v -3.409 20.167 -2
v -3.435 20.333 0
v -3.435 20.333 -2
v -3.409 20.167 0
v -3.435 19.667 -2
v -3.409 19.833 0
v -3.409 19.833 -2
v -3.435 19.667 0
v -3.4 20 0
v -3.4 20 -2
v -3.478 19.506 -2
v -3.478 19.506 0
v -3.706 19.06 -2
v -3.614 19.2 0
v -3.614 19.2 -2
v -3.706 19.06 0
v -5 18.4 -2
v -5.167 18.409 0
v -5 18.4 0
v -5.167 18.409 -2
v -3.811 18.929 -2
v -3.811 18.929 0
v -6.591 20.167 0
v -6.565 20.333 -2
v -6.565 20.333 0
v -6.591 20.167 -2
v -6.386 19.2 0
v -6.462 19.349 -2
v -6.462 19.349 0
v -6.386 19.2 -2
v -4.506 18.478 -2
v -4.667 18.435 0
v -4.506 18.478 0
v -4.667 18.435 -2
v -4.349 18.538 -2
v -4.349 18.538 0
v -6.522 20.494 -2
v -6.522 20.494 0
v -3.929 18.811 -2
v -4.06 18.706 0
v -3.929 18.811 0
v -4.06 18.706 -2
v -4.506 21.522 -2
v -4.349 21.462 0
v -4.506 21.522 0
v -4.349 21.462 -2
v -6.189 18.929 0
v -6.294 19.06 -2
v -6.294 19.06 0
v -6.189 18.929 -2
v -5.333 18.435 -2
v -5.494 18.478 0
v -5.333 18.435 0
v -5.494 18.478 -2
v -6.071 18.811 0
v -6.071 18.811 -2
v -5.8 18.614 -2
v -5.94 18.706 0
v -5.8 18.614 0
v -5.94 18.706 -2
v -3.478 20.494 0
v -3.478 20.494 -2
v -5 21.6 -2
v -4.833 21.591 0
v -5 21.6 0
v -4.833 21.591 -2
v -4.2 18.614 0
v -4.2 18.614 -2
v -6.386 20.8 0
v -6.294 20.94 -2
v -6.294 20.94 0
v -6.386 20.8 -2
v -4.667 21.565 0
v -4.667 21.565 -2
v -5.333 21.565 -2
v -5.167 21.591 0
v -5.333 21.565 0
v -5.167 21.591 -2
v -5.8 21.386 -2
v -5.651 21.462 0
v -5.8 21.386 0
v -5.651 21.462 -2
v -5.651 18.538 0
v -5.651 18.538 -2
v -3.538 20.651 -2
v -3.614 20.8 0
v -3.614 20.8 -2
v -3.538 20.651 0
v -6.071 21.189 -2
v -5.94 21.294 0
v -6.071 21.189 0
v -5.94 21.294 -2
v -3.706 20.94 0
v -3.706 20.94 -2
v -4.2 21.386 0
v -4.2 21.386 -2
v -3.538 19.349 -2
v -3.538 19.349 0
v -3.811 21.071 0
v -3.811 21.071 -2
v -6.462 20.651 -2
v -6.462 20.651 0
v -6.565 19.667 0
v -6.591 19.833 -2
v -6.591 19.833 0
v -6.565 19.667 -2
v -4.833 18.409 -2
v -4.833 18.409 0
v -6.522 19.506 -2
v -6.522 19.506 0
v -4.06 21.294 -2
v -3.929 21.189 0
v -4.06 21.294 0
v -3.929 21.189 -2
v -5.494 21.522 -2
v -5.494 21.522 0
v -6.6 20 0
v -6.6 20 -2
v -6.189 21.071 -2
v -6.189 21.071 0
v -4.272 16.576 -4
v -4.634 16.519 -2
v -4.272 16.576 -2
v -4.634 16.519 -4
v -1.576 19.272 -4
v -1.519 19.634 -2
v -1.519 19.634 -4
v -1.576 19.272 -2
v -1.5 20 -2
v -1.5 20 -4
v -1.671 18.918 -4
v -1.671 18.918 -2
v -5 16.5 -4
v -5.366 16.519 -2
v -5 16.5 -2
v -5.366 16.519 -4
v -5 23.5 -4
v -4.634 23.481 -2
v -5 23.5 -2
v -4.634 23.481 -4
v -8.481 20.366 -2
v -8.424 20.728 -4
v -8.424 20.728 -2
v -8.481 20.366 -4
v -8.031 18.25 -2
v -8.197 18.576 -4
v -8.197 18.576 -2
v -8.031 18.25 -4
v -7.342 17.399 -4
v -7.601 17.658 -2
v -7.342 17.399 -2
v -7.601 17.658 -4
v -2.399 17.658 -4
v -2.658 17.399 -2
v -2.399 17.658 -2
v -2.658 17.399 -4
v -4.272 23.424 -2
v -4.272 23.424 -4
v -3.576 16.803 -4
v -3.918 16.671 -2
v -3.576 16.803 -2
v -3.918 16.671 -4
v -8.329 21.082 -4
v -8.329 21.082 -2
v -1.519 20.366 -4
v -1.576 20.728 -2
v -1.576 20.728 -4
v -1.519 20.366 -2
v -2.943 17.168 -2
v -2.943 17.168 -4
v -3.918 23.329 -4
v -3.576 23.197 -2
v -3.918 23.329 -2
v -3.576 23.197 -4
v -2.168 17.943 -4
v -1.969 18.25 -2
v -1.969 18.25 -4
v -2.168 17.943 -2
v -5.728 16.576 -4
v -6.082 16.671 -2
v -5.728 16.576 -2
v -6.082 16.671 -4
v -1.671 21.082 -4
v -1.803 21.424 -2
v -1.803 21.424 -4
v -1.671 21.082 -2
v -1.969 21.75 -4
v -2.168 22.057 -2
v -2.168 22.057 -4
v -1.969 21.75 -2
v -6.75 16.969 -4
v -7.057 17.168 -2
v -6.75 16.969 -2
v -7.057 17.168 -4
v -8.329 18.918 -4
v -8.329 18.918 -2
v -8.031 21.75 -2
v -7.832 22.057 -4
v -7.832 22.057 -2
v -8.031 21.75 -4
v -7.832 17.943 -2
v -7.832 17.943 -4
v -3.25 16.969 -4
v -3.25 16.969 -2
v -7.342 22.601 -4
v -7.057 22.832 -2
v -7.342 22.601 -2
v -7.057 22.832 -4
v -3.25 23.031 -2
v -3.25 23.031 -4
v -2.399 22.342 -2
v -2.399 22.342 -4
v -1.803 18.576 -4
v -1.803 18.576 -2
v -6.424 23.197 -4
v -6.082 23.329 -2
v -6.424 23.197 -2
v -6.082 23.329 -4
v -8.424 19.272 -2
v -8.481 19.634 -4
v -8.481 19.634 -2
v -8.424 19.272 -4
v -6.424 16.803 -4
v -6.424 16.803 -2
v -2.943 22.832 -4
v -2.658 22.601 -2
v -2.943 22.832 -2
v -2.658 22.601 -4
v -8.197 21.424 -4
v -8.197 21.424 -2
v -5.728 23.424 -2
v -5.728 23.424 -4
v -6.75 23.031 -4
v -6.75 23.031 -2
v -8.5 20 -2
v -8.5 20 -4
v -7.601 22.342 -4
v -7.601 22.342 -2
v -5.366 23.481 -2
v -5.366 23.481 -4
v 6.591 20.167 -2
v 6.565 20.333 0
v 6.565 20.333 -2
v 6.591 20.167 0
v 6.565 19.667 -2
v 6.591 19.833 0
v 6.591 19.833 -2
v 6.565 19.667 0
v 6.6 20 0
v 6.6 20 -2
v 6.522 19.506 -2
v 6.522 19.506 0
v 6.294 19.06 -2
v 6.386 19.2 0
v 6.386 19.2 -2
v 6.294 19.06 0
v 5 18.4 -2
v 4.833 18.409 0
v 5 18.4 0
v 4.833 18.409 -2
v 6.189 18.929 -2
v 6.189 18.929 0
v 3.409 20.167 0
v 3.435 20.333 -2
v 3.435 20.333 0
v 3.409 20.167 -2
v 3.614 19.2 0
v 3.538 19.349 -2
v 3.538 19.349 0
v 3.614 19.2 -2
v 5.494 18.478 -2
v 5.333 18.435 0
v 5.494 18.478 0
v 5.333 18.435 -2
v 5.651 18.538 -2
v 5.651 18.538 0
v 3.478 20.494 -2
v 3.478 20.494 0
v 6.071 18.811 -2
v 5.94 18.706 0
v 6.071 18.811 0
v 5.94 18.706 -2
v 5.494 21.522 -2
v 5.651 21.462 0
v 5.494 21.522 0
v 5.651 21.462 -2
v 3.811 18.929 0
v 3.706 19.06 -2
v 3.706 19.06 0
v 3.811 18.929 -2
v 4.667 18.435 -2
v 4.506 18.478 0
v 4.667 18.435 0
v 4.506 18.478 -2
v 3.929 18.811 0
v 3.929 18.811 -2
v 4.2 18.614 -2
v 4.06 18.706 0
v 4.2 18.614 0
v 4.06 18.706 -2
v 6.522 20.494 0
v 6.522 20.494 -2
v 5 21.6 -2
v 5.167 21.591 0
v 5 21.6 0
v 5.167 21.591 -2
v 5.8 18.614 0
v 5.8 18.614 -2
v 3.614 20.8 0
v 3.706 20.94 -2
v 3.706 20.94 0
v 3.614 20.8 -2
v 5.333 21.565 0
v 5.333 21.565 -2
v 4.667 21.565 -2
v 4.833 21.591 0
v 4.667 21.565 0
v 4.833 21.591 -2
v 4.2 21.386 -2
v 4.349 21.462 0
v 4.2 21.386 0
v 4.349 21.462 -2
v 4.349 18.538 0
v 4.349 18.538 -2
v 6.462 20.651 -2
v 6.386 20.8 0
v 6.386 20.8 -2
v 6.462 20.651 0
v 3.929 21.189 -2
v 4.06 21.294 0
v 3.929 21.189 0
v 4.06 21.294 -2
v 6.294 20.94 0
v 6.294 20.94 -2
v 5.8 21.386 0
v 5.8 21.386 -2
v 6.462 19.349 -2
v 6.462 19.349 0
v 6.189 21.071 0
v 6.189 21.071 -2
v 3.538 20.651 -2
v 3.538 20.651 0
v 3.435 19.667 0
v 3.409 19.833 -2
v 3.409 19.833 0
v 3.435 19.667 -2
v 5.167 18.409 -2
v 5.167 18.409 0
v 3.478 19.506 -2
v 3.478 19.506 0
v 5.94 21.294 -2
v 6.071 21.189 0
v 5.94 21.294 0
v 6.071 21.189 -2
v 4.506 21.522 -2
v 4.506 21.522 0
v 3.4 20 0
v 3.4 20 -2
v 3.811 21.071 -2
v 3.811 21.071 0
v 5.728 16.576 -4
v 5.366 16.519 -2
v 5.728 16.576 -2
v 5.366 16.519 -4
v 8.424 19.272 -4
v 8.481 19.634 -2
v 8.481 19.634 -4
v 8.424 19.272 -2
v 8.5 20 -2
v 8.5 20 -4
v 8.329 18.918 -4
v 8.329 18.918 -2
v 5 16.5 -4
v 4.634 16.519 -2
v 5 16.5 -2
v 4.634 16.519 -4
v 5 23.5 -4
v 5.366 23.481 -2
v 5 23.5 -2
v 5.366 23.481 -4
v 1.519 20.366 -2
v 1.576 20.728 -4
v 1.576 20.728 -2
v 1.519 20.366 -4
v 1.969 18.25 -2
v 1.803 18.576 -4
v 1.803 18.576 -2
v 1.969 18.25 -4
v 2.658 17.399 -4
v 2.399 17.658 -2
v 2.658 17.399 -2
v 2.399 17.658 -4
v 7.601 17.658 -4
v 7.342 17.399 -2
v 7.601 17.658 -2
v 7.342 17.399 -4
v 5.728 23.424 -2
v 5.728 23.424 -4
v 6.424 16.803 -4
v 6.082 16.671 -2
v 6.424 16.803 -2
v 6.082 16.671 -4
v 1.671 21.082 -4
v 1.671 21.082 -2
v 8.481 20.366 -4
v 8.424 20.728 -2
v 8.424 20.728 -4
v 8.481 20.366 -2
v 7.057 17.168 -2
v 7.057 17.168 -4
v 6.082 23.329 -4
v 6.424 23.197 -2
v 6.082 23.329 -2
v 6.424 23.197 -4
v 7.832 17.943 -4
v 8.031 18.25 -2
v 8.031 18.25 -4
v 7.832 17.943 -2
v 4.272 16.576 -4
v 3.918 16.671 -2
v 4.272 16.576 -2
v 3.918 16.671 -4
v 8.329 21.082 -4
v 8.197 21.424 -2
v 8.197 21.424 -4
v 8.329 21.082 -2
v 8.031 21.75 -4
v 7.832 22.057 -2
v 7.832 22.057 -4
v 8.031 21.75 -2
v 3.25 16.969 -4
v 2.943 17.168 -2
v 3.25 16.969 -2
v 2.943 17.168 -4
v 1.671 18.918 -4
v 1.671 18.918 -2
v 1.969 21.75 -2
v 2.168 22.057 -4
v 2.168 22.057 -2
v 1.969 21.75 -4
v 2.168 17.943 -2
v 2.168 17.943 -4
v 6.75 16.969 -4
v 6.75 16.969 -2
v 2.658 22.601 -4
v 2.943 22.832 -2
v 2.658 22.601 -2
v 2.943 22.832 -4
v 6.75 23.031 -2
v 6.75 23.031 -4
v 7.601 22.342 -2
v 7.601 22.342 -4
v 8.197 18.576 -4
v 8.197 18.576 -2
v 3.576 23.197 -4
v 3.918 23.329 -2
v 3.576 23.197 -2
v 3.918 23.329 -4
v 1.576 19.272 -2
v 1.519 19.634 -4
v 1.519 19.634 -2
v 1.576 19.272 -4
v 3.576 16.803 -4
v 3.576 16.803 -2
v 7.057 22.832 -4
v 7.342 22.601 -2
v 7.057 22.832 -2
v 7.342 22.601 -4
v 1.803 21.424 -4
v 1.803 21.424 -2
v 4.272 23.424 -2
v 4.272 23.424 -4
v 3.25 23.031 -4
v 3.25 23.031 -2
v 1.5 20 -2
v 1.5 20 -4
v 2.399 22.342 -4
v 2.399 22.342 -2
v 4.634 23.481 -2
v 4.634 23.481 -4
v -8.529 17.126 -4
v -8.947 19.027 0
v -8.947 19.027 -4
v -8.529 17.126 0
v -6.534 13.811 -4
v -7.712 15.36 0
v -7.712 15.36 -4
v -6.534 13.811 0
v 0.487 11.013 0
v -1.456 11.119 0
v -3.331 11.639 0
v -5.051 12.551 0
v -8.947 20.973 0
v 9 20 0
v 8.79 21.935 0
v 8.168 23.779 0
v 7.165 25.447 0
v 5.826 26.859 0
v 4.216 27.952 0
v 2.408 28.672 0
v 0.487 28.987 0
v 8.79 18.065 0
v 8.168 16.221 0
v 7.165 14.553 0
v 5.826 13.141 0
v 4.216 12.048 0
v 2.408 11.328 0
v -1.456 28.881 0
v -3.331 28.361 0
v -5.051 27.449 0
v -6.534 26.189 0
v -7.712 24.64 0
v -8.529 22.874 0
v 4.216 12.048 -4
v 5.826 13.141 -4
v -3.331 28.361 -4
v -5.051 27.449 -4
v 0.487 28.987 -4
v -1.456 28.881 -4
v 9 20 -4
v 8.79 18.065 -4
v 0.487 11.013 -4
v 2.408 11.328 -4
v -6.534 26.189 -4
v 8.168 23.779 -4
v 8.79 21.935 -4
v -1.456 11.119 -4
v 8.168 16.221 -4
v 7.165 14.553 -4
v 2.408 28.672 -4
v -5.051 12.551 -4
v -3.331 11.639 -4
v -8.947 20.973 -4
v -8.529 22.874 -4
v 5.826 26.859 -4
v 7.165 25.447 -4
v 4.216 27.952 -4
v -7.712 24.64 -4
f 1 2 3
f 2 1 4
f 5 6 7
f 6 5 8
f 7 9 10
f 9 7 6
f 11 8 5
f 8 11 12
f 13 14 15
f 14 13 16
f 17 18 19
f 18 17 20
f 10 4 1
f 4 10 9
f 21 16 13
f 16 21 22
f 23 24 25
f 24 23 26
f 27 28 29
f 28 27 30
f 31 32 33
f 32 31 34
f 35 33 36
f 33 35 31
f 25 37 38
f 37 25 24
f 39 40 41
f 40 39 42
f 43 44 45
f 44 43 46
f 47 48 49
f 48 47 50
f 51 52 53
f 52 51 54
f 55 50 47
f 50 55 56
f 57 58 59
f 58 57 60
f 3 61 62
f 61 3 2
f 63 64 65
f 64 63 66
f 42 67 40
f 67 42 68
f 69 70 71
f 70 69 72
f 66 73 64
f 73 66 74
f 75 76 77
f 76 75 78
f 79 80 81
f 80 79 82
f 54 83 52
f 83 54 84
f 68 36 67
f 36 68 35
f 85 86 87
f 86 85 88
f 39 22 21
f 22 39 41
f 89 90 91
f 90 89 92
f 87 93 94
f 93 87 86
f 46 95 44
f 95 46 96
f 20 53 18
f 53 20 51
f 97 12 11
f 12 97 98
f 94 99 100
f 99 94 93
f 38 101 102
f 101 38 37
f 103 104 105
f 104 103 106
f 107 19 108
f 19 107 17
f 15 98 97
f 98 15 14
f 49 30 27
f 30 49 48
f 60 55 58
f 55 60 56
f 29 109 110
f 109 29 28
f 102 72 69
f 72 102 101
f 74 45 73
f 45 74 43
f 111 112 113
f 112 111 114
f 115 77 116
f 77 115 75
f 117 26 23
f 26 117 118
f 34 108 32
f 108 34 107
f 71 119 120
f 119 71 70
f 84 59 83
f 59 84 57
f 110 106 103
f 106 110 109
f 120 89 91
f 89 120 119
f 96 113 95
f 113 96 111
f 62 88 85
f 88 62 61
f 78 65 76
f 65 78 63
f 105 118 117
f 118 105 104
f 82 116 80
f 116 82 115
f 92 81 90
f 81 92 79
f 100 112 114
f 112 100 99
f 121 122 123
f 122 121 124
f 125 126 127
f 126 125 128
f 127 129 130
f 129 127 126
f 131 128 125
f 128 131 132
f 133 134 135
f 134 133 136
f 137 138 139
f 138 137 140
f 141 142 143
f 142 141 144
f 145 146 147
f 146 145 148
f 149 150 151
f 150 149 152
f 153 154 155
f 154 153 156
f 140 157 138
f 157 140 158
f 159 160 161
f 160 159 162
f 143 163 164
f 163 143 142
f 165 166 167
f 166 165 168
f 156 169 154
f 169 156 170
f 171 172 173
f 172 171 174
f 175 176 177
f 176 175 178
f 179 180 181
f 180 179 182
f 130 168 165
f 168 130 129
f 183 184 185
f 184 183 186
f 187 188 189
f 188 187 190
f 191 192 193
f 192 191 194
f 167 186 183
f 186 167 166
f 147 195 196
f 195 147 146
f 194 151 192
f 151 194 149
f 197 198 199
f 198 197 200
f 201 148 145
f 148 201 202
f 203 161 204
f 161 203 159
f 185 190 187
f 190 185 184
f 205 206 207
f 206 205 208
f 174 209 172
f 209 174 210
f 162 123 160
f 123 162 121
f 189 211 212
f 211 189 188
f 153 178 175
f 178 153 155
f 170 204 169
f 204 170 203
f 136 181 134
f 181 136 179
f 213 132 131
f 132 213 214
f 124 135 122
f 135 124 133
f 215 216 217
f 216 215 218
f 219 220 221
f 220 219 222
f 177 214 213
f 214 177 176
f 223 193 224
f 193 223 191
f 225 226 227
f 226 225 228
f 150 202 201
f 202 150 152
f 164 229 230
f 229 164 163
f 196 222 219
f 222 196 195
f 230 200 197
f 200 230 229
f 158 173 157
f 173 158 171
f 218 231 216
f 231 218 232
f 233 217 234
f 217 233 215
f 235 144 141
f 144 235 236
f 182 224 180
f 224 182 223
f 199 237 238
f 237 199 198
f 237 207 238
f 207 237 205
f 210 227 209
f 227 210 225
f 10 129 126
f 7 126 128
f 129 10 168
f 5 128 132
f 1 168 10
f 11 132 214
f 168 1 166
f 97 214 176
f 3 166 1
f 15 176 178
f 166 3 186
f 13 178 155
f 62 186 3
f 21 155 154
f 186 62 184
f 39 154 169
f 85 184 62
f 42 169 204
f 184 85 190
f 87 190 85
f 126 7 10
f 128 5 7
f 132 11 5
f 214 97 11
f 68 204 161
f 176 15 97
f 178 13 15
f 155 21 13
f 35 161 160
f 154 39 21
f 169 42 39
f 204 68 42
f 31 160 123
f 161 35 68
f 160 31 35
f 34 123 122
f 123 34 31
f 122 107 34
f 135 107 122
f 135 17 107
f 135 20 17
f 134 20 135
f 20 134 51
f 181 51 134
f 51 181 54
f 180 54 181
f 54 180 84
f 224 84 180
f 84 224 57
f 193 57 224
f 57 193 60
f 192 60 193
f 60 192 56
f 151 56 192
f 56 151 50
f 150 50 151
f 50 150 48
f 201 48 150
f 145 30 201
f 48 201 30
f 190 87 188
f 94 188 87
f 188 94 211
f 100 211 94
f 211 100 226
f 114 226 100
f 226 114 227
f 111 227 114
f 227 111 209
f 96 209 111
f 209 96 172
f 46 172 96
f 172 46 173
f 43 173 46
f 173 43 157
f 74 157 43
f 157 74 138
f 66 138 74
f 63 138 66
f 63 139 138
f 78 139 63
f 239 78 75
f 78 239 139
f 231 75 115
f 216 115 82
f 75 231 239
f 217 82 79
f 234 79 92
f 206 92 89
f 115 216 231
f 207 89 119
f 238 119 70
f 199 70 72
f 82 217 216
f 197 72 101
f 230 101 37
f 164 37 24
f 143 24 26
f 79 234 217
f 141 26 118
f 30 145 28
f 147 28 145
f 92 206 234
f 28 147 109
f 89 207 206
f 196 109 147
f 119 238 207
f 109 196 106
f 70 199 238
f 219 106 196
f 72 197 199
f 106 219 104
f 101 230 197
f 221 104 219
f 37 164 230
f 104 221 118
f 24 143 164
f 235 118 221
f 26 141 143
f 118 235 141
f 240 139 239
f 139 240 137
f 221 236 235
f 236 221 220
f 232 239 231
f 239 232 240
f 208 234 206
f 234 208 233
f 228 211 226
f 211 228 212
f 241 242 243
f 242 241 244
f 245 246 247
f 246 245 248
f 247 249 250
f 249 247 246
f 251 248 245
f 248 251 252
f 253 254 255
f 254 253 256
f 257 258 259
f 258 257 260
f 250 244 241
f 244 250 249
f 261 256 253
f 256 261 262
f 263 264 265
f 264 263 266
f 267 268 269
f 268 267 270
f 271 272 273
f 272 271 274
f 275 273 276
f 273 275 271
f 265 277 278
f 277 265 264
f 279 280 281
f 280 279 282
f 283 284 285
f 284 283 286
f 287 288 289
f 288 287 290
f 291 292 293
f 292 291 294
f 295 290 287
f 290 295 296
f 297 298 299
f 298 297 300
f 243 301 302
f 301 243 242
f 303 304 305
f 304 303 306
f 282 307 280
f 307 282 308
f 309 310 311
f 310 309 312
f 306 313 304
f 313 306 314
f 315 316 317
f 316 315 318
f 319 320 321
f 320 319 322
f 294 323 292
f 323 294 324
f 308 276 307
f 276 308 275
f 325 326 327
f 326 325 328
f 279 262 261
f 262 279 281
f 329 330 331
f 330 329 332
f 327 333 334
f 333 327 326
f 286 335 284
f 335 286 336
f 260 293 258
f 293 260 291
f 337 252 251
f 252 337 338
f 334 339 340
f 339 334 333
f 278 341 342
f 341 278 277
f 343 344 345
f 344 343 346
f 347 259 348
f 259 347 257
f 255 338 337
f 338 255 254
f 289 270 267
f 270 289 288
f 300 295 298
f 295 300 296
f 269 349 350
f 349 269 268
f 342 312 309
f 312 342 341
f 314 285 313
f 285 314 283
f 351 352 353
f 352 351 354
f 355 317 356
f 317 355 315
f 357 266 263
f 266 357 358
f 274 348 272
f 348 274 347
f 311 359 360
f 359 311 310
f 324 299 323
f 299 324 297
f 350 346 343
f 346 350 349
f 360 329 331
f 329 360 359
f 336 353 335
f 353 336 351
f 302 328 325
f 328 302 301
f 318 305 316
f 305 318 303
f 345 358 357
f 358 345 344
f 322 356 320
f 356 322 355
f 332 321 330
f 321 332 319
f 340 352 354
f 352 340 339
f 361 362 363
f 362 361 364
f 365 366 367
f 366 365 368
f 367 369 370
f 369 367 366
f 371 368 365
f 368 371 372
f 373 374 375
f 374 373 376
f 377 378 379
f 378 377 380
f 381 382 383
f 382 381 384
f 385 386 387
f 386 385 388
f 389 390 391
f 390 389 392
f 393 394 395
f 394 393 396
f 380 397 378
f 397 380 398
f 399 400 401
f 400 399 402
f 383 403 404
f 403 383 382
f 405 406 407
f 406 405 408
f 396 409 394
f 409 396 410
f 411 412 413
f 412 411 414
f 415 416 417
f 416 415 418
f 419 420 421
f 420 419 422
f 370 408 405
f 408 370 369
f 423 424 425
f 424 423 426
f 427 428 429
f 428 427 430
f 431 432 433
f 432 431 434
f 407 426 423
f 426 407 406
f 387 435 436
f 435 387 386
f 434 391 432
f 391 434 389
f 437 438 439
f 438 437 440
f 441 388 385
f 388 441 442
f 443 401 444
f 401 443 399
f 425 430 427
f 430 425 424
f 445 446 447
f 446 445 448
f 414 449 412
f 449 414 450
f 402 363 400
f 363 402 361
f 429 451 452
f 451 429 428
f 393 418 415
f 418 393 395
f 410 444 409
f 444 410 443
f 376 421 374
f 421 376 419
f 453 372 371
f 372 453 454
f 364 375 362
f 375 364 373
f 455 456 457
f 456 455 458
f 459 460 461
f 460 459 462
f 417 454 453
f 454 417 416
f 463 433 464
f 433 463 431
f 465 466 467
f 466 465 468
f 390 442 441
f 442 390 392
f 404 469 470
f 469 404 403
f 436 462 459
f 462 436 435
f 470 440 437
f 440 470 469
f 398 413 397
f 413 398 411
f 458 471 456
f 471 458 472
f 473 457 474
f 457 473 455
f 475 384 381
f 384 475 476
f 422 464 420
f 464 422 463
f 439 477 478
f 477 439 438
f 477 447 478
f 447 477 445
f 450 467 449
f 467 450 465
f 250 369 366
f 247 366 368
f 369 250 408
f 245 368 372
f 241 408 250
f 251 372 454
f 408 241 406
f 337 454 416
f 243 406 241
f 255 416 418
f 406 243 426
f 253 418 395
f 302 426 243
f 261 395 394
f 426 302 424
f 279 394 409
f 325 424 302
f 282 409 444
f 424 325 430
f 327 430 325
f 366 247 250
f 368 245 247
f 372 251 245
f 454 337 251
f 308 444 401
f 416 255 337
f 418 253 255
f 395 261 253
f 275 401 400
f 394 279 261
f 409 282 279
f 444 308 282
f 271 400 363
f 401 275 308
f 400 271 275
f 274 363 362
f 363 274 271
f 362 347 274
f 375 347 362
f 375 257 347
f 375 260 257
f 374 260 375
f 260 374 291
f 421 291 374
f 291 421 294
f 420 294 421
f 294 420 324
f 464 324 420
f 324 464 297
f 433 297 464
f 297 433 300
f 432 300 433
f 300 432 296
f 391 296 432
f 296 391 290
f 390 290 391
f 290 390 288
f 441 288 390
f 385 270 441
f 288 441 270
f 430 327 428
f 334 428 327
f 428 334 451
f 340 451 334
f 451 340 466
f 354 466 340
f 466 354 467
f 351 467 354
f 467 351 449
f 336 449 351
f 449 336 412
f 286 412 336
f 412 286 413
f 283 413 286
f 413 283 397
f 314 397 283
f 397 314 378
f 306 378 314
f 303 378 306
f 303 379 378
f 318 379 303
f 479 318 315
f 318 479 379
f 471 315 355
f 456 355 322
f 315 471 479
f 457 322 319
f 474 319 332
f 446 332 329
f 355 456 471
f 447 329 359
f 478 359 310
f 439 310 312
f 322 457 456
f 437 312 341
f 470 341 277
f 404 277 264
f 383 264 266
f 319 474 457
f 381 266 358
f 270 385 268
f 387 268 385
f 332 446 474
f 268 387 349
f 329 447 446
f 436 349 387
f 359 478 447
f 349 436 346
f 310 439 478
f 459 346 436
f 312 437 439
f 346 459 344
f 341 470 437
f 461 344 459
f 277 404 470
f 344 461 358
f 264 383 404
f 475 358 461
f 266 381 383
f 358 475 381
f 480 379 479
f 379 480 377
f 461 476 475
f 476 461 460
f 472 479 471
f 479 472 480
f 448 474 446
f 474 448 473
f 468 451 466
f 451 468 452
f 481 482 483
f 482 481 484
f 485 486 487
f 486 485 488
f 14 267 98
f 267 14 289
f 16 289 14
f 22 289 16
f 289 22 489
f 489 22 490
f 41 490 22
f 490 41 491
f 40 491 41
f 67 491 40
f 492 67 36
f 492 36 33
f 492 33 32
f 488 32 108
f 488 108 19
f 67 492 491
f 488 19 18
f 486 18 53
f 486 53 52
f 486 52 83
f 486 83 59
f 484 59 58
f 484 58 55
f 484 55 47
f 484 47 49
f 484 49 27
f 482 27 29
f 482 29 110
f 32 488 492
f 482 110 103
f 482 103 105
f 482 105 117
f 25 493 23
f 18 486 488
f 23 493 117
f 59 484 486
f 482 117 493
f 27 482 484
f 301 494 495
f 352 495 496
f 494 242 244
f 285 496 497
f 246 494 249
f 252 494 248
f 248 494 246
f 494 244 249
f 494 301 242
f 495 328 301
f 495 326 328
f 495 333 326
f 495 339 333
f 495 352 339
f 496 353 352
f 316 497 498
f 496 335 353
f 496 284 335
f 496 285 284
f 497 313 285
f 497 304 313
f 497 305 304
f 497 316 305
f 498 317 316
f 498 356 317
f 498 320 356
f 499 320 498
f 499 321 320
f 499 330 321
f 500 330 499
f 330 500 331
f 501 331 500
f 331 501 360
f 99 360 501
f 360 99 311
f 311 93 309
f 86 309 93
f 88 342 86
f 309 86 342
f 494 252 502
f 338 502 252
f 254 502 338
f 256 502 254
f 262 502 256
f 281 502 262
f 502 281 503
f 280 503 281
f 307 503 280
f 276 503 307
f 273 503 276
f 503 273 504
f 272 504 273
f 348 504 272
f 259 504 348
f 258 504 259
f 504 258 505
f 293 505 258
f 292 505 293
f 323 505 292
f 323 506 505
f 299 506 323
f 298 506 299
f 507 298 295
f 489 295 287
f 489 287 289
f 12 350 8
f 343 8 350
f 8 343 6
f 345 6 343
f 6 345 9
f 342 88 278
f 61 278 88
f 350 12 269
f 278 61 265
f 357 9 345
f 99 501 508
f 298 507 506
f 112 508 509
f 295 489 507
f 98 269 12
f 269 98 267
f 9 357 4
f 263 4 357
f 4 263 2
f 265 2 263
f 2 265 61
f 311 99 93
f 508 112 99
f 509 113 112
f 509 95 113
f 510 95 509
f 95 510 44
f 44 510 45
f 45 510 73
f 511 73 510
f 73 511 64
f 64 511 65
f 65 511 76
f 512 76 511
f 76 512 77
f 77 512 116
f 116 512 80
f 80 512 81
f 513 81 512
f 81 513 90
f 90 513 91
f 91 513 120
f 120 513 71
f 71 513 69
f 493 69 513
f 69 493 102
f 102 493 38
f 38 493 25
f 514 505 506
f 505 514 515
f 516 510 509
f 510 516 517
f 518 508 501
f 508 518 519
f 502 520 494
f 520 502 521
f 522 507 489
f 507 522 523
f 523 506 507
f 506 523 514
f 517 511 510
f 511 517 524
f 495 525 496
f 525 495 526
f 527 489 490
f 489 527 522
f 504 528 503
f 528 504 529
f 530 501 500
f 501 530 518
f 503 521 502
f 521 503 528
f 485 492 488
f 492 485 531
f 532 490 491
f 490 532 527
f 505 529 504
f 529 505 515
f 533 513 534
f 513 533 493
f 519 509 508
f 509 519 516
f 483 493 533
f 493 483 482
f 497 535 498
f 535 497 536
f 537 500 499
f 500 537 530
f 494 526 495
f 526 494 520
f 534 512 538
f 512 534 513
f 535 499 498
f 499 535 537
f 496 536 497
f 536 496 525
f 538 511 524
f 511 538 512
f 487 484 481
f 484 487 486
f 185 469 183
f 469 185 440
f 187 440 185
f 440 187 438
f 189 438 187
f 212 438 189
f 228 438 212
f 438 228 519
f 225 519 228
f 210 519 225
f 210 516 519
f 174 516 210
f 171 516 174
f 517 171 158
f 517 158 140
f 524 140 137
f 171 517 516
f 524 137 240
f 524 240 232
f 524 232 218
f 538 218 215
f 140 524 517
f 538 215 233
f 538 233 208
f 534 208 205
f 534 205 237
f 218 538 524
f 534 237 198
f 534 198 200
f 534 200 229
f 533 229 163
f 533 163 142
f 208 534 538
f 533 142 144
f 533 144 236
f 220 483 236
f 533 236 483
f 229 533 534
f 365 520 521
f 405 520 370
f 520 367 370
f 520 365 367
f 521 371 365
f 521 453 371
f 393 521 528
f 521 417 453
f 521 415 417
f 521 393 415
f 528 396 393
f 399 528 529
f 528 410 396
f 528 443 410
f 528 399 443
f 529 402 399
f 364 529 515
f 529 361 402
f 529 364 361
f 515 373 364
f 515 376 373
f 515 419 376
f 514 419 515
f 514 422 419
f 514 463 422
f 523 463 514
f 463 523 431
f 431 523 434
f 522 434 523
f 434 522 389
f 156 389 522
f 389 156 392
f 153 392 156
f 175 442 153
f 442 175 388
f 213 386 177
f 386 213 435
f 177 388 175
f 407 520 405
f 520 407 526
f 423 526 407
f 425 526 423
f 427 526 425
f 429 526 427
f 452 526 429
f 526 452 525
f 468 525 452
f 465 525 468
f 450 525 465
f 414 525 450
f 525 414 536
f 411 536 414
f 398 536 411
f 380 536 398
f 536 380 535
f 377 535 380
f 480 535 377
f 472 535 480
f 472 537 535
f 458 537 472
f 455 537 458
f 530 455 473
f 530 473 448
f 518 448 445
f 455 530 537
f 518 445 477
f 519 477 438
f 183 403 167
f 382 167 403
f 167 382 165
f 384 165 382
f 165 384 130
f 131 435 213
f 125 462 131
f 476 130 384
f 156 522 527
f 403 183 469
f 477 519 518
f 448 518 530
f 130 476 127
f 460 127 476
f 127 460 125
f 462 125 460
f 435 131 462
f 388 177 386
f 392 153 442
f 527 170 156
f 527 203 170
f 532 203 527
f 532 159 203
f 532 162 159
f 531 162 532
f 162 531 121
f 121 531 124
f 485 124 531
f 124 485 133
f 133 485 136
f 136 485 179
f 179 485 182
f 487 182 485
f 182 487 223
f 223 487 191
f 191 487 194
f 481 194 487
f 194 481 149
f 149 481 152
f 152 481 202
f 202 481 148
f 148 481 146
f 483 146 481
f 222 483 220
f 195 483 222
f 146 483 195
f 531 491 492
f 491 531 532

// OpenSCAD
// Bettkastenbox

/* [Bodenteil-Anzahl der Muster (40x40)/Dicke:] */
Bodenbreite = 3; //[1:1:3]
// 1 -3 Einheiten
Bodentiefe = 5; //[1:1:5]
// 1 - 5 Einheiten

Bodendicke = 4; // [3:1:10]
// in mm

/* [Lochmuster:] */
Langloch = false;
Quaderloch = false;


/* [Teile:] */
Bodenteil = false;
GanzerBoden = false;
Connector = true;


/* [Bodenart:] */
BodenGeschlossen = false;
BodenOffen = true;

module Langloch() {
    hull() {
        cylinder(d=10,h=Bodendicke+2);
        translate([10,10,0]) cylinder(d=10,h=Bodendicke+2); 
    }
}

module Quaderloch() {
    translate([-5,-5,0])     cube([20,20,Bodendicke+2]);
}

module Bohrloch() {
    $fn = 60;
    translate([0,0,-1])
    cylinder(d=3.2,h=Bodendicke+2);
    translate([0,0,Bodendicke-2])
    cylinder(d=7,h=3);
}
module Lochraster () {
    translate([15,15,-1])
    if (Langloch) Langloch();
    if (Quaderloch) Quaderloch();
}

module Bohrlochraster () {
    translate([MusterX/2,5,0])
    for(i=[0:Bodentiefe-1]){
        for (j=[0:Bodenbreite]) {
            translate([i*MusterX, j*MusterY,0]) Bohrloch();
        }
    }

    translate([5,5+MusterY/2,0])
    for(i=[0:0]){
        for (j=[1:Bodenbreite]) {
            translate([0, (j-1)*MusterY,0]) Bohrloch();
        }
    }

    translate([BodenX-5,5+MusterY/2,0])
    for(i=[0:0]){
        for (j=[1:Bodenbreite]) {
            translate([0,(j-1)*MusterY,0]) Bohrloch();
        }
    }


}
module Bodenteil() {
    cube([40,40,Bodendicke]);
}

module Lochboden() {
    difference() {
        Bodenteil();
        Lochraster();
        #Bohrlochraster();
    }
}

module Boden() {
    for(i=[0:Bodentiefe-1]){
        for (j=[0:Bodenbreite-1]) {
            translate([i*MusterX, j*MusterY,0])
            Lochboden();
        }
    }
} 

module Bettkastenbox() {
    translate([0,0,5])
    for (i=[0:1]) {
        for (j=[0:2]) {
            if (BodenGeschlossen) translate([(i*BodenX),(j*BodenY),0])
            Boden();
            if (BodenOffen)translate([(i*BodenX)+i,(j*BodenY)+j,0])
            Boden();
        }
    }
}

module ConnectorScheibe() {
    translate([0,20,-Bodendicke])
    hull(){
        cylinder(d=18,h=Bodendicke);
        translate([0,0,0])
        cylinder(d=18,h=Bodendicke);
    }
}

module Connector() {
    difference(){
        ConnectorScheibe();
        translate([-5,20,0])
        rotate([180,0,0])
        Bohrloch();
        translate([5,20,0])
        rotate([180,0,0])
        Bohrloch();
    }
}
// Variablen

MusterX = 40;
MusterY = 30;

BodenX = (Bodentiefe * MusterX);
BodenY = 10+(Bodenbreite * MusterY);

// Hauptprogramm

if (GanzerBoden)
    color("gray") Bettkastenbox();

if (Bodenteil)
    Boden();

if (Connector)
    
    color("Lightblue")Connector();
